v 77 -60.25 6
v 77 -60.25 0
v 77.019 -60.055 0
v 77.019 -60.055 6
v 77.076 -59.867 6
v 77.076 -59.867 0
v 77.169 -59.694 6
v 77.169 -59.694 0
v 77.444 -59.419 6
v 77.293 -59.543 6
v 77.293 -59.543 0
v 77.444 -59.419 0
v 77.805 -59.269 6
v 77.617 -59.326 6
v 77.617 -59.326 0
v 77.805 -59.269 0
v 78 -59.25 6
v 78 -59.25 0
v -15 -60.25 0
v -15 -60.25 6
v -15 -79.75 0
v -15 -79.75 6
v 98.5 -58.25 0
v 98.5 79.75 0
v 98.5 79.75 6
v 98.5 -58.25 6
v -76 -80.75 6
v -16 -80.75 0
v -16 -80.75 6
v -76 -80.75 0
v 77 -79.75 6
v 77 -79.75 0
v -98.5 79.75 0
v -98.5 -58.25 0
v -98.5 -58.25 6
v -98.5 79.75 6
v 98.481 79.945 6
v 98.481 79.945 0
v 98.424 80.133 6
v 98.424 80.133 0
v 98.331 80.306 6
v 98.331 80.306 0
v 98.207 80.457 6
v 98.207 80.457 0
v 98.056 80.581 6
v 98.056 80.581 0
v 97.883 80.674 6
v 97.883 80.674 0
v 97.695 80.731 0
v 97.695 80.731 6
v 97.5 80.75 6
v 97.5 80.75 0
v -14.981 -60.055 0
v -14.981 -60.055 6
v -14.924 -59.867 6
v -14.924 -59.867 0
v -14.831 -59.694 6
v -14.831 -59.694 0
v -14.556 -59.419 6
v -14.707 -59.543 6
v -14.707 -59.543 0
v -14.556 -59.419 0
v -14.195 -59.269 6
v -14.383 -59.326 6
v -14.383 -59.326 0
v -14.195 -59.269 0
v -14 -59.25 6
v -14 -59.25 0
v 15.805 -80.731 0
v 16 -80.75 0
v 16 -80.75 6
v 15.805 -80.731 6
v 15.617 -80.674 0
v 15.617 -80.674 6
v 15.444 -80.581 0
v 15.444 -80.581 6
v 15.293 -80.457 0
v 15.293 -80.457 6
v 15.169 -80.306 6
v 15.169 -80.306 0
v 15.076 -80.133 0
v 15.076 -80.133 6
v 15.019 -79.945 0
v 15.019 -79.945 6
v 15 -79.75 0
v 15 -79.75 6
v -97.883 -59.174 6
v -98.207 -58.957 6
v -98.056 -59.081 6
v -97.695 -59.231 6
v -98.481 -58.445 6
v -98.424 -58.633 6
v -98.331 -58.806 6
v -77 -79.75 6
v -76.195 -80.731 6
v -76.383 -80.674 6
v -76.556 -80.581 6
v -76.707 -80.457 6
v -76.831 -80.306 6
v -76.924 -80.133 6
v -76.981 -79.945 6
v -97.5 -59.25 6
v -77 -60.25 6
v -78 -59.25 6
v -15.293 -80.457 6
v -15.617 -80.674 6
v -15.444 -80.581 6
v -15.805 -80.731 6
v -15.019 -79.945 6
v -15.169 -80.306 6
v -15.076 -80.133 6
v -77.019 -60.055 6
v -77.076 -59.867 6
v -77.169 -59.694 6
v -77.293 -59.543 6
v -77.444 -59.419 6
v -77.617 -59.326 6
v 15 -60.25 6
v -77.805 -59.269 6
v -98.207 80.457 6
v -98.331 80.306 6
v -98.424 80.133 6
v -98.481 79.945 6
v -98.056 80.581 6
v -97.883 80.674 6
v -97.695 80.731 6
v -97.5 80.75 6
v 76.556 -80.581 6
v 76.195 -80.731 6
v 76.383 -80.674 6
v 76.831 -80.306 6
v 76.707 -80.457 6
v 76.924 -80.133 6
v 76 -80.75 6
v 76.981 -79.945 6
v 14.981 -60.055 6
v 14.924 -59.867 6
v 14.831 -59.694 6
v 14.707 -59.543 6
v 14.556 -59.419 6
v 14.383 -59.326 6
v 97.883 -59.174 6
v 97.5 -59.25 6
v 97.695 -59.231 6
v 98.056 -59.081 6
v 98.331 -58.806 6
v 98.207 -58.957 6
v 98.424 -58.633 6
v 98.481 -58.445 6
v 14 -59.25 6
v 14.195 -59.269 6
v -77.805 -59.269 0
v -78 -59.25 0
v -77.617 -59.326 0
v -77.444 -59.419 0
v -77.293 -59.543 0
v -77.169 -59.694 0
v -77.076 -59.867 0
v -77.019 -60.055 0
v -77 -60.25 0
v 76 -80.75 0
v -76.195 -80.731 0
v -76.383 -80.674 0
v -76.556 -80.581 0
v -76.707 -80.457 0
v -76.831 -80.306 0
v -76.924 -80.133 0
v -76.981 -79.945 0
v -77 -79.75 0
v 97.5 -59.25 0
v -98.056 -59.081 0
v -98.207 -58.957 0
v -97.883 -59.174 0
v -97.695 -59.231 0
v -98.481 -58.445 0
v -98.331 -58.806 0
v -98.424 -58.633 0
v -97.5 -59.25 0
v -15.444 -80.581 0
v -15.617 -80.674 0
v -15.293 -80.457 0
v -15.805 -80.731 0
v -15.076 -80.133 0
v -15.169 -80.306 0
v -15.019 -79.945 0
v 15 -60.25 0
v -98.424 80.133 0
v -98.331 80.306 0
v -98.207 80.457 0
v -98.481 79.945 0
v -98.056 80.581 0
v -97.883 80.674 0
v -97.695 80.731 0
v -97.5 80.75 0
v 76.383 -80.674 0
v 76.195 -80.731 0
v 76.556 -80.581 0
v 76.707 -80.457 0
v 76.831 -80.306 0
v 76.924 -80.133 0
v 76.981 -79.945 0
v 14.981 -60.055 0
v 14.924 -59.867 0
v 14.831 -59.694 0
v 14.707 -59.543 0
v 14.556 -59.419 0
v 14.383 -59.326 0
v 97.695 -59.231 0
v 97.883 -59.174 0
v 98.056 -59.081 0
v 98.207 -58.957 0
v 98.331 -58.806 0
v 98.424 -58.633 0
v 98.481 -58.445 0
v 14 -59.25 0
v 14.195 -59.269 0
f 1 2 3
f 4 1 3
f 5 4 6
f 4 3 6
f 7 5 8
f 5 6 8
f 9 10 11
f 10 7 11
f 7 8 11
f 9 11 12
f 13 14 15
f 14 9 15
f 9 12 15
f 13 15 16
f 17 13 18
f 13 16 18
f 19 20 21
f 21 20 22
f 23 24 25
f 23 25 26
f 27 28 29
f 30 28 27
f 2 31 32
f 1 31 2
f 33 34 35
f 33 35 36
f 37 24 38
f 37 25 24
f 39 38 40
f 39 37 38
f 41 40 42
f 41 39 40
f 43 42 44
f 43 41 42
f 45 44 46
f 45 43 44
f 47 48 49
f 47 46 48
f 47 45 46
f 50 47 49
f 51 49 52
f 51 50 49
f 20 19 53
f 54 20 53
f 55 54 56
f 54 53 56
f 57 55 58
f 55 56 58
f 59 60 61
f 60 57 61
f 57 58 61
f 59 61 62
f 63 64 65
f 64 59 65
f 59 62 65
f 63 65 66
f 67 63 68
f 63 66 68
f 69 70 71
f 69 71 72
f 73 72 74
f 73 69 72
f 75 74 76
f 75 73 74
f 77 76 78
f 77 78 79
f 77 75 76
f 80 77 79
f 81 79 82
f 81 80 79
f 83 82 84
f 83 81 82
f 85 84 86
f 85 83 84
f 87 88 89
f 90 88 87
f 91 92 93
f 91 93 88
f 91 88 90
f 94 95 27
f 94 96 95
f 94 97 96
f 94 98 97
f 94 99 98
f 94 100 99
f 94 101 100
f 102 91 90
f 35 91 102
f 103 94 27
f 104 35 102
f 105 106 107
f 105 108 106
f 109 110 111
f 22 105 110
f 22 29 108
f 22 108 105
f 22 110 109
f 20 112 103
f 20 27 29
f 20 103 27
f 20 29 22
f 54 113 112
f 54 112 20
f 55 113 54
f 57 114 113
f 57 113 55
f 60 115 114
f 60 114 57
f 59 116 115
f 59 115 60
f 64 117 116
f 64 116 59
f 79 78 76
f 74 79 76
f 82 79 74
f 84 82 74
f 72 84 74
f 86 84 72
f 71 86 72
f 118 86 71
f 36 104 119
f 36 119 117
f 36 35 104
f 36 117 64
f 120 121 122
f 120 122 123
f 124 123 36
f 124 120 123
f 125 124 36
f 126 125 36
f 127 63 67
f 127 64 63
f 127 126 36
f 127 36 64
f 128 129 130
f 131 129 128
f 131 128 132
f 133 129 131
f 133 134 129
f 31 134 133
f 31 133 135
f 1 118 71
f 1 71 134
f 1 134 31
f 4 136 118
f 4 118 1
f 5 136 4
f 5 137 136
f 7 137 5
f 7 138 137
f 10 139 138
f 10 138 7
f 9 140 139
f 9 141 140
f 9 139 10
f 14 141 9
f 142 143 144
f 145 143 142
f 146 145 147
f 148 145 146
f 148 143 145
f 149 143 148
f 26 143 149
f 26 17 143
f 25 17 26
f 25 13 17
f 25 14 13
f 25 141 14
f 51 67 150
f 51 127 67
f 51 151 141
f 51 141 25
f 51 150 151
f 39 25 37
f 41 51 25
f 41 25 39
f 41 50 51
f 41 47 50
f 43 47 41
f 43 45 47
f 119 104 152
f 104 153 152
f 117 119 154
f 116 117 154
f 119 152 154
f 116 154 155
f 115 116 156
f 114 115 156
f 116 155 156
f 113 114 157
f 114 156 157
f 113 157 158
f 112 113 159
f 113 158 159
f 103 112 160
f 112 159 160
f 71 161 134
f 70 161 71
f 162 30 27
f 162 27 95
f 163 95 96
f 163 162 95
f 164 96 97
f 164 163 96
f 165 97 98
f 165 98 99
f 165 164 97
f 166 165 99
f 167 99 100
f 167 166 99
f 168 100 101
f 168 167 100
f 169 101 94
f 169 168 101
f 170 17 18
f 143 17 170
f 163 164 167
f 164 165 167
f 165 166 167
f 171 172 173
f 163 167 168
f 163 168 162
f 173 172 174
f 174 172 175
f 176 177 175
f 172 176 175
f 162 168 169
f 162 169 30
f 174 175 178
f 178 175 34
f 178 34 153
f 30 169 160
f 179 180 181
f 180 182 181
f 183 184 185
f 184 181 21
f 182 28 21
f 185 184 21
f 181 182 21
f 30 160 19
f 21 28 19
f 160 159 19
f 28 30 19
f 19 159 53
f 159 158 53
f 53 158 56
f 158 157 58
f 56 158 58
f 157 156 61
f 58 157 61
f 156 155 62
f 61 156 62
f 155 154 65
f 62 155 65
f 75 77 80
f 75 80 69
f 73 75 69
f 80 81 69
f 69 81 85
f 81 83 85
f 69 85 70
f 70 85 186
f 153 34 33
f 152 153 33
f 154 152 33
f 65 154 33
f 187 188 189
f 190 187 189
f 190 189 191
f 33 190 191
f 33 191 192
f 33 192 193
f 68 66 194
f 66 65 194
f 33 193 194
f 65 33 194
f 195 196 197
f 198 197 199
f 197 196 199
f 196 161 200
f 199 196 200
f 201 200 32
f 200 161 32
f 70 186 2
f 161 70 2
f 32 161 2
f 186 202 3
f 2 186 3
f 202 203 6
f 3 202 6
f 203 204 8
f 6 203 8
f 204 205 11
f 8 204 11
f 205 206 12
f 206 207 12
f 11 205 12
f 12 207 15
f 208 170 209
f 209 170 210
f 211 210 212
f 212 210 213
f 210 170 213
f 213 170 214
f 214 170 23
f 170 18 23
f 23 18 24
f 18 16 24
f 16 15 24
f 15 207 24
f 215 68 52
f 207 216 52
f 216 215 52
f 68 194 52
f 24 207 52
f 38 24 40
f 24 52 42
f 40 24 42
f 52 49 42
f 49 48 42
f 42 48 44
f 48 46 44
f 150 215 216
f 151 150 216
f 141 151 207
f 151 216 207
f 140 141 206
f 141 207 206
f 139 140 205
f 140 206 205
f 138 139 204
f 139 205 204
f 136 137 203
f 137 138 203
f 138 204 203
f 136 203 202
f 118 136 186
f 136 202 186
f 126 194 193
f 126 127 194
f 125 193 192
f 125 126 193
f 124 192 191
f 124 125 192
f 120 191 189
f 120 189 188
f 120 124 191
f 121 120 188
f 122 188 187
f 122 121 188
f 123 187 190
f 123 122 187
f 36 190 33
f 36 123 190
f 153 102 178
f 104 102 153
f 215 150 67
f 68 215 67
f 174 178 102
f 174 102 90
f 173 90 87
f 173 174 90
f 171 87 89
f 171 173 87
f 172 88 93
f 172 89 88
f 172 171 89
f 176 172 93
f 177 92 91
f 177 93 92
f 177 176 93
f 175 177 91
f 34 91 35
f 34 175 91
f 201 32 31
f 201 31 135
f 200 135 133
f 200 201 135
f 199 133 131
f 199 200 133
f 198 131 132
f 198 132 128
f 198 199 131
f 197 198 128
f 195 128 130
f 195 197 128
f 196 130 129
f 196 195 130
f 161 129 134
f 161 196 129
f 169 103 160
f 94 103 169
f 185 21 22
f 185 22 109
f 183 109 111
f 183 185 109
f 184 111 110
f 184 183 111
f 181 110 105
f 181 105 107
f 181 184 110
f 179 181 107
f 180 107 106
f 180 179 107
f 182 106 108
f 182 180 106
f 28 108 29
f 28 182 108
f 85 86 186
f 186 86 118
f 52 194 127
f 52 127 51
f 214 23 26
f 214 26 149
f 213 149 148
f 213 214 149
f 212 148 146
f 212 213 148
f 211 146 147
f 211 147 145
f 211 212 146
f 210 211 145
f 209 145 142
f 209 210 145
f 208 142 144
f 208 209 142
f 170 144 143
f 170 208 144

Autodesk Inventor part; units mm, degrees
sketch "Sketch1" plane through (0, 0, 0) normal (0, 0, 1) x (1, 0, 0)
  line L0 (-98.5, 80.75) -> (98.5, 80.75)
  line L1 (98.5, 80.75) -> (98.5, -80.75)
  line L2 (98.5, -80.75) -> (-98.5, -80.75)
  line L3 (-98.5, -80.75) -> (-98.5, 80.75)
  point P0 (0, 80.75)
  point P1 (0, 0)
  point P2 (-98.5, 0)
  dimension "d0" = 197
  dimension "d1" = 161.5
extrude "Extrusion1" add sketch "Sketch1" along normal blind 6
sketch "Sketch2" plane through (0, 0, 6) normal (0, 0, 1) x (1, 0, 0)
  line L0 (-98.5, 80.75) -> (-98.5, -80.75) projected
  line L1 (-98.5, -80.75) -> (-98.5, -59.25)
  line L2 (-98.5, -59.25) -> (-77, -59.25)
  line L3 (-98.5, -80.75) -> (98.5, -80.75) projected
  line L4 (-77, -59.25) -> (-77, -80.75)
  line L5 (-98.5, -80.75) -> (-77, -80.75)
  point P0 (0, 0)
  point P1 (40.5, -62.5)
  point P2 (-64.5, -80.75)
  dimension "d14" = 21.5
  dimension "d15" = 21.5
extrude "Extrusion2" cut sketch "Sketch2" against normal blind 15
mirror "Mirror1" about plane through (0, 0, 0) normal (1, 0, 0) of "Extrusion2"
sketch "Sketch4" plane through (0, 0, 6) normal (0, 0, 1) x (1, 0, 0)
  line L0 (-77, -80.75) -> (77, -80.75) projected
  line L1 (-15, -80.75) -> (15, -80.75)
  line L2 (15, -80.75) -> (15, -59.25)
  line L3 (15, -59.25) -> (-15, -59.25)
  line L4 (-15, -59.25) -> (-15, -80.75)
  point P0 (0, 0)
  point P1 (-64.5, -67.75)
  point P2 (64.5, -67.75)
  point P3 (0, -59.25)
  point P4 (0, -80.75)
  dimension "d18" = 30
  dimension "d19" = 21.5
extrude "Extrusion4" cut sketch "Sketch4" against normal blind 10
fillet "Fillet1" radius 1 12 edges at (-98.5, -59.25, 3) (-15, -80.75, 3) (15, -80.75, 3) (98.5, -59.25, 3) (-15, -59.25, 3) (15, -59.25, 3) (-98.5, 80.75, 3) (98.5, 80.75, 3) (-77, -59.25, 3) (-77, -80.75, 3) (77, -80.75, 3) (77, -59.25, 3)
equation "\"d7\" = d5"
equation "\"d5\" = 15"
properties part number "Side_Side_MDF" material "MDF Medium Density Fiberboard"
